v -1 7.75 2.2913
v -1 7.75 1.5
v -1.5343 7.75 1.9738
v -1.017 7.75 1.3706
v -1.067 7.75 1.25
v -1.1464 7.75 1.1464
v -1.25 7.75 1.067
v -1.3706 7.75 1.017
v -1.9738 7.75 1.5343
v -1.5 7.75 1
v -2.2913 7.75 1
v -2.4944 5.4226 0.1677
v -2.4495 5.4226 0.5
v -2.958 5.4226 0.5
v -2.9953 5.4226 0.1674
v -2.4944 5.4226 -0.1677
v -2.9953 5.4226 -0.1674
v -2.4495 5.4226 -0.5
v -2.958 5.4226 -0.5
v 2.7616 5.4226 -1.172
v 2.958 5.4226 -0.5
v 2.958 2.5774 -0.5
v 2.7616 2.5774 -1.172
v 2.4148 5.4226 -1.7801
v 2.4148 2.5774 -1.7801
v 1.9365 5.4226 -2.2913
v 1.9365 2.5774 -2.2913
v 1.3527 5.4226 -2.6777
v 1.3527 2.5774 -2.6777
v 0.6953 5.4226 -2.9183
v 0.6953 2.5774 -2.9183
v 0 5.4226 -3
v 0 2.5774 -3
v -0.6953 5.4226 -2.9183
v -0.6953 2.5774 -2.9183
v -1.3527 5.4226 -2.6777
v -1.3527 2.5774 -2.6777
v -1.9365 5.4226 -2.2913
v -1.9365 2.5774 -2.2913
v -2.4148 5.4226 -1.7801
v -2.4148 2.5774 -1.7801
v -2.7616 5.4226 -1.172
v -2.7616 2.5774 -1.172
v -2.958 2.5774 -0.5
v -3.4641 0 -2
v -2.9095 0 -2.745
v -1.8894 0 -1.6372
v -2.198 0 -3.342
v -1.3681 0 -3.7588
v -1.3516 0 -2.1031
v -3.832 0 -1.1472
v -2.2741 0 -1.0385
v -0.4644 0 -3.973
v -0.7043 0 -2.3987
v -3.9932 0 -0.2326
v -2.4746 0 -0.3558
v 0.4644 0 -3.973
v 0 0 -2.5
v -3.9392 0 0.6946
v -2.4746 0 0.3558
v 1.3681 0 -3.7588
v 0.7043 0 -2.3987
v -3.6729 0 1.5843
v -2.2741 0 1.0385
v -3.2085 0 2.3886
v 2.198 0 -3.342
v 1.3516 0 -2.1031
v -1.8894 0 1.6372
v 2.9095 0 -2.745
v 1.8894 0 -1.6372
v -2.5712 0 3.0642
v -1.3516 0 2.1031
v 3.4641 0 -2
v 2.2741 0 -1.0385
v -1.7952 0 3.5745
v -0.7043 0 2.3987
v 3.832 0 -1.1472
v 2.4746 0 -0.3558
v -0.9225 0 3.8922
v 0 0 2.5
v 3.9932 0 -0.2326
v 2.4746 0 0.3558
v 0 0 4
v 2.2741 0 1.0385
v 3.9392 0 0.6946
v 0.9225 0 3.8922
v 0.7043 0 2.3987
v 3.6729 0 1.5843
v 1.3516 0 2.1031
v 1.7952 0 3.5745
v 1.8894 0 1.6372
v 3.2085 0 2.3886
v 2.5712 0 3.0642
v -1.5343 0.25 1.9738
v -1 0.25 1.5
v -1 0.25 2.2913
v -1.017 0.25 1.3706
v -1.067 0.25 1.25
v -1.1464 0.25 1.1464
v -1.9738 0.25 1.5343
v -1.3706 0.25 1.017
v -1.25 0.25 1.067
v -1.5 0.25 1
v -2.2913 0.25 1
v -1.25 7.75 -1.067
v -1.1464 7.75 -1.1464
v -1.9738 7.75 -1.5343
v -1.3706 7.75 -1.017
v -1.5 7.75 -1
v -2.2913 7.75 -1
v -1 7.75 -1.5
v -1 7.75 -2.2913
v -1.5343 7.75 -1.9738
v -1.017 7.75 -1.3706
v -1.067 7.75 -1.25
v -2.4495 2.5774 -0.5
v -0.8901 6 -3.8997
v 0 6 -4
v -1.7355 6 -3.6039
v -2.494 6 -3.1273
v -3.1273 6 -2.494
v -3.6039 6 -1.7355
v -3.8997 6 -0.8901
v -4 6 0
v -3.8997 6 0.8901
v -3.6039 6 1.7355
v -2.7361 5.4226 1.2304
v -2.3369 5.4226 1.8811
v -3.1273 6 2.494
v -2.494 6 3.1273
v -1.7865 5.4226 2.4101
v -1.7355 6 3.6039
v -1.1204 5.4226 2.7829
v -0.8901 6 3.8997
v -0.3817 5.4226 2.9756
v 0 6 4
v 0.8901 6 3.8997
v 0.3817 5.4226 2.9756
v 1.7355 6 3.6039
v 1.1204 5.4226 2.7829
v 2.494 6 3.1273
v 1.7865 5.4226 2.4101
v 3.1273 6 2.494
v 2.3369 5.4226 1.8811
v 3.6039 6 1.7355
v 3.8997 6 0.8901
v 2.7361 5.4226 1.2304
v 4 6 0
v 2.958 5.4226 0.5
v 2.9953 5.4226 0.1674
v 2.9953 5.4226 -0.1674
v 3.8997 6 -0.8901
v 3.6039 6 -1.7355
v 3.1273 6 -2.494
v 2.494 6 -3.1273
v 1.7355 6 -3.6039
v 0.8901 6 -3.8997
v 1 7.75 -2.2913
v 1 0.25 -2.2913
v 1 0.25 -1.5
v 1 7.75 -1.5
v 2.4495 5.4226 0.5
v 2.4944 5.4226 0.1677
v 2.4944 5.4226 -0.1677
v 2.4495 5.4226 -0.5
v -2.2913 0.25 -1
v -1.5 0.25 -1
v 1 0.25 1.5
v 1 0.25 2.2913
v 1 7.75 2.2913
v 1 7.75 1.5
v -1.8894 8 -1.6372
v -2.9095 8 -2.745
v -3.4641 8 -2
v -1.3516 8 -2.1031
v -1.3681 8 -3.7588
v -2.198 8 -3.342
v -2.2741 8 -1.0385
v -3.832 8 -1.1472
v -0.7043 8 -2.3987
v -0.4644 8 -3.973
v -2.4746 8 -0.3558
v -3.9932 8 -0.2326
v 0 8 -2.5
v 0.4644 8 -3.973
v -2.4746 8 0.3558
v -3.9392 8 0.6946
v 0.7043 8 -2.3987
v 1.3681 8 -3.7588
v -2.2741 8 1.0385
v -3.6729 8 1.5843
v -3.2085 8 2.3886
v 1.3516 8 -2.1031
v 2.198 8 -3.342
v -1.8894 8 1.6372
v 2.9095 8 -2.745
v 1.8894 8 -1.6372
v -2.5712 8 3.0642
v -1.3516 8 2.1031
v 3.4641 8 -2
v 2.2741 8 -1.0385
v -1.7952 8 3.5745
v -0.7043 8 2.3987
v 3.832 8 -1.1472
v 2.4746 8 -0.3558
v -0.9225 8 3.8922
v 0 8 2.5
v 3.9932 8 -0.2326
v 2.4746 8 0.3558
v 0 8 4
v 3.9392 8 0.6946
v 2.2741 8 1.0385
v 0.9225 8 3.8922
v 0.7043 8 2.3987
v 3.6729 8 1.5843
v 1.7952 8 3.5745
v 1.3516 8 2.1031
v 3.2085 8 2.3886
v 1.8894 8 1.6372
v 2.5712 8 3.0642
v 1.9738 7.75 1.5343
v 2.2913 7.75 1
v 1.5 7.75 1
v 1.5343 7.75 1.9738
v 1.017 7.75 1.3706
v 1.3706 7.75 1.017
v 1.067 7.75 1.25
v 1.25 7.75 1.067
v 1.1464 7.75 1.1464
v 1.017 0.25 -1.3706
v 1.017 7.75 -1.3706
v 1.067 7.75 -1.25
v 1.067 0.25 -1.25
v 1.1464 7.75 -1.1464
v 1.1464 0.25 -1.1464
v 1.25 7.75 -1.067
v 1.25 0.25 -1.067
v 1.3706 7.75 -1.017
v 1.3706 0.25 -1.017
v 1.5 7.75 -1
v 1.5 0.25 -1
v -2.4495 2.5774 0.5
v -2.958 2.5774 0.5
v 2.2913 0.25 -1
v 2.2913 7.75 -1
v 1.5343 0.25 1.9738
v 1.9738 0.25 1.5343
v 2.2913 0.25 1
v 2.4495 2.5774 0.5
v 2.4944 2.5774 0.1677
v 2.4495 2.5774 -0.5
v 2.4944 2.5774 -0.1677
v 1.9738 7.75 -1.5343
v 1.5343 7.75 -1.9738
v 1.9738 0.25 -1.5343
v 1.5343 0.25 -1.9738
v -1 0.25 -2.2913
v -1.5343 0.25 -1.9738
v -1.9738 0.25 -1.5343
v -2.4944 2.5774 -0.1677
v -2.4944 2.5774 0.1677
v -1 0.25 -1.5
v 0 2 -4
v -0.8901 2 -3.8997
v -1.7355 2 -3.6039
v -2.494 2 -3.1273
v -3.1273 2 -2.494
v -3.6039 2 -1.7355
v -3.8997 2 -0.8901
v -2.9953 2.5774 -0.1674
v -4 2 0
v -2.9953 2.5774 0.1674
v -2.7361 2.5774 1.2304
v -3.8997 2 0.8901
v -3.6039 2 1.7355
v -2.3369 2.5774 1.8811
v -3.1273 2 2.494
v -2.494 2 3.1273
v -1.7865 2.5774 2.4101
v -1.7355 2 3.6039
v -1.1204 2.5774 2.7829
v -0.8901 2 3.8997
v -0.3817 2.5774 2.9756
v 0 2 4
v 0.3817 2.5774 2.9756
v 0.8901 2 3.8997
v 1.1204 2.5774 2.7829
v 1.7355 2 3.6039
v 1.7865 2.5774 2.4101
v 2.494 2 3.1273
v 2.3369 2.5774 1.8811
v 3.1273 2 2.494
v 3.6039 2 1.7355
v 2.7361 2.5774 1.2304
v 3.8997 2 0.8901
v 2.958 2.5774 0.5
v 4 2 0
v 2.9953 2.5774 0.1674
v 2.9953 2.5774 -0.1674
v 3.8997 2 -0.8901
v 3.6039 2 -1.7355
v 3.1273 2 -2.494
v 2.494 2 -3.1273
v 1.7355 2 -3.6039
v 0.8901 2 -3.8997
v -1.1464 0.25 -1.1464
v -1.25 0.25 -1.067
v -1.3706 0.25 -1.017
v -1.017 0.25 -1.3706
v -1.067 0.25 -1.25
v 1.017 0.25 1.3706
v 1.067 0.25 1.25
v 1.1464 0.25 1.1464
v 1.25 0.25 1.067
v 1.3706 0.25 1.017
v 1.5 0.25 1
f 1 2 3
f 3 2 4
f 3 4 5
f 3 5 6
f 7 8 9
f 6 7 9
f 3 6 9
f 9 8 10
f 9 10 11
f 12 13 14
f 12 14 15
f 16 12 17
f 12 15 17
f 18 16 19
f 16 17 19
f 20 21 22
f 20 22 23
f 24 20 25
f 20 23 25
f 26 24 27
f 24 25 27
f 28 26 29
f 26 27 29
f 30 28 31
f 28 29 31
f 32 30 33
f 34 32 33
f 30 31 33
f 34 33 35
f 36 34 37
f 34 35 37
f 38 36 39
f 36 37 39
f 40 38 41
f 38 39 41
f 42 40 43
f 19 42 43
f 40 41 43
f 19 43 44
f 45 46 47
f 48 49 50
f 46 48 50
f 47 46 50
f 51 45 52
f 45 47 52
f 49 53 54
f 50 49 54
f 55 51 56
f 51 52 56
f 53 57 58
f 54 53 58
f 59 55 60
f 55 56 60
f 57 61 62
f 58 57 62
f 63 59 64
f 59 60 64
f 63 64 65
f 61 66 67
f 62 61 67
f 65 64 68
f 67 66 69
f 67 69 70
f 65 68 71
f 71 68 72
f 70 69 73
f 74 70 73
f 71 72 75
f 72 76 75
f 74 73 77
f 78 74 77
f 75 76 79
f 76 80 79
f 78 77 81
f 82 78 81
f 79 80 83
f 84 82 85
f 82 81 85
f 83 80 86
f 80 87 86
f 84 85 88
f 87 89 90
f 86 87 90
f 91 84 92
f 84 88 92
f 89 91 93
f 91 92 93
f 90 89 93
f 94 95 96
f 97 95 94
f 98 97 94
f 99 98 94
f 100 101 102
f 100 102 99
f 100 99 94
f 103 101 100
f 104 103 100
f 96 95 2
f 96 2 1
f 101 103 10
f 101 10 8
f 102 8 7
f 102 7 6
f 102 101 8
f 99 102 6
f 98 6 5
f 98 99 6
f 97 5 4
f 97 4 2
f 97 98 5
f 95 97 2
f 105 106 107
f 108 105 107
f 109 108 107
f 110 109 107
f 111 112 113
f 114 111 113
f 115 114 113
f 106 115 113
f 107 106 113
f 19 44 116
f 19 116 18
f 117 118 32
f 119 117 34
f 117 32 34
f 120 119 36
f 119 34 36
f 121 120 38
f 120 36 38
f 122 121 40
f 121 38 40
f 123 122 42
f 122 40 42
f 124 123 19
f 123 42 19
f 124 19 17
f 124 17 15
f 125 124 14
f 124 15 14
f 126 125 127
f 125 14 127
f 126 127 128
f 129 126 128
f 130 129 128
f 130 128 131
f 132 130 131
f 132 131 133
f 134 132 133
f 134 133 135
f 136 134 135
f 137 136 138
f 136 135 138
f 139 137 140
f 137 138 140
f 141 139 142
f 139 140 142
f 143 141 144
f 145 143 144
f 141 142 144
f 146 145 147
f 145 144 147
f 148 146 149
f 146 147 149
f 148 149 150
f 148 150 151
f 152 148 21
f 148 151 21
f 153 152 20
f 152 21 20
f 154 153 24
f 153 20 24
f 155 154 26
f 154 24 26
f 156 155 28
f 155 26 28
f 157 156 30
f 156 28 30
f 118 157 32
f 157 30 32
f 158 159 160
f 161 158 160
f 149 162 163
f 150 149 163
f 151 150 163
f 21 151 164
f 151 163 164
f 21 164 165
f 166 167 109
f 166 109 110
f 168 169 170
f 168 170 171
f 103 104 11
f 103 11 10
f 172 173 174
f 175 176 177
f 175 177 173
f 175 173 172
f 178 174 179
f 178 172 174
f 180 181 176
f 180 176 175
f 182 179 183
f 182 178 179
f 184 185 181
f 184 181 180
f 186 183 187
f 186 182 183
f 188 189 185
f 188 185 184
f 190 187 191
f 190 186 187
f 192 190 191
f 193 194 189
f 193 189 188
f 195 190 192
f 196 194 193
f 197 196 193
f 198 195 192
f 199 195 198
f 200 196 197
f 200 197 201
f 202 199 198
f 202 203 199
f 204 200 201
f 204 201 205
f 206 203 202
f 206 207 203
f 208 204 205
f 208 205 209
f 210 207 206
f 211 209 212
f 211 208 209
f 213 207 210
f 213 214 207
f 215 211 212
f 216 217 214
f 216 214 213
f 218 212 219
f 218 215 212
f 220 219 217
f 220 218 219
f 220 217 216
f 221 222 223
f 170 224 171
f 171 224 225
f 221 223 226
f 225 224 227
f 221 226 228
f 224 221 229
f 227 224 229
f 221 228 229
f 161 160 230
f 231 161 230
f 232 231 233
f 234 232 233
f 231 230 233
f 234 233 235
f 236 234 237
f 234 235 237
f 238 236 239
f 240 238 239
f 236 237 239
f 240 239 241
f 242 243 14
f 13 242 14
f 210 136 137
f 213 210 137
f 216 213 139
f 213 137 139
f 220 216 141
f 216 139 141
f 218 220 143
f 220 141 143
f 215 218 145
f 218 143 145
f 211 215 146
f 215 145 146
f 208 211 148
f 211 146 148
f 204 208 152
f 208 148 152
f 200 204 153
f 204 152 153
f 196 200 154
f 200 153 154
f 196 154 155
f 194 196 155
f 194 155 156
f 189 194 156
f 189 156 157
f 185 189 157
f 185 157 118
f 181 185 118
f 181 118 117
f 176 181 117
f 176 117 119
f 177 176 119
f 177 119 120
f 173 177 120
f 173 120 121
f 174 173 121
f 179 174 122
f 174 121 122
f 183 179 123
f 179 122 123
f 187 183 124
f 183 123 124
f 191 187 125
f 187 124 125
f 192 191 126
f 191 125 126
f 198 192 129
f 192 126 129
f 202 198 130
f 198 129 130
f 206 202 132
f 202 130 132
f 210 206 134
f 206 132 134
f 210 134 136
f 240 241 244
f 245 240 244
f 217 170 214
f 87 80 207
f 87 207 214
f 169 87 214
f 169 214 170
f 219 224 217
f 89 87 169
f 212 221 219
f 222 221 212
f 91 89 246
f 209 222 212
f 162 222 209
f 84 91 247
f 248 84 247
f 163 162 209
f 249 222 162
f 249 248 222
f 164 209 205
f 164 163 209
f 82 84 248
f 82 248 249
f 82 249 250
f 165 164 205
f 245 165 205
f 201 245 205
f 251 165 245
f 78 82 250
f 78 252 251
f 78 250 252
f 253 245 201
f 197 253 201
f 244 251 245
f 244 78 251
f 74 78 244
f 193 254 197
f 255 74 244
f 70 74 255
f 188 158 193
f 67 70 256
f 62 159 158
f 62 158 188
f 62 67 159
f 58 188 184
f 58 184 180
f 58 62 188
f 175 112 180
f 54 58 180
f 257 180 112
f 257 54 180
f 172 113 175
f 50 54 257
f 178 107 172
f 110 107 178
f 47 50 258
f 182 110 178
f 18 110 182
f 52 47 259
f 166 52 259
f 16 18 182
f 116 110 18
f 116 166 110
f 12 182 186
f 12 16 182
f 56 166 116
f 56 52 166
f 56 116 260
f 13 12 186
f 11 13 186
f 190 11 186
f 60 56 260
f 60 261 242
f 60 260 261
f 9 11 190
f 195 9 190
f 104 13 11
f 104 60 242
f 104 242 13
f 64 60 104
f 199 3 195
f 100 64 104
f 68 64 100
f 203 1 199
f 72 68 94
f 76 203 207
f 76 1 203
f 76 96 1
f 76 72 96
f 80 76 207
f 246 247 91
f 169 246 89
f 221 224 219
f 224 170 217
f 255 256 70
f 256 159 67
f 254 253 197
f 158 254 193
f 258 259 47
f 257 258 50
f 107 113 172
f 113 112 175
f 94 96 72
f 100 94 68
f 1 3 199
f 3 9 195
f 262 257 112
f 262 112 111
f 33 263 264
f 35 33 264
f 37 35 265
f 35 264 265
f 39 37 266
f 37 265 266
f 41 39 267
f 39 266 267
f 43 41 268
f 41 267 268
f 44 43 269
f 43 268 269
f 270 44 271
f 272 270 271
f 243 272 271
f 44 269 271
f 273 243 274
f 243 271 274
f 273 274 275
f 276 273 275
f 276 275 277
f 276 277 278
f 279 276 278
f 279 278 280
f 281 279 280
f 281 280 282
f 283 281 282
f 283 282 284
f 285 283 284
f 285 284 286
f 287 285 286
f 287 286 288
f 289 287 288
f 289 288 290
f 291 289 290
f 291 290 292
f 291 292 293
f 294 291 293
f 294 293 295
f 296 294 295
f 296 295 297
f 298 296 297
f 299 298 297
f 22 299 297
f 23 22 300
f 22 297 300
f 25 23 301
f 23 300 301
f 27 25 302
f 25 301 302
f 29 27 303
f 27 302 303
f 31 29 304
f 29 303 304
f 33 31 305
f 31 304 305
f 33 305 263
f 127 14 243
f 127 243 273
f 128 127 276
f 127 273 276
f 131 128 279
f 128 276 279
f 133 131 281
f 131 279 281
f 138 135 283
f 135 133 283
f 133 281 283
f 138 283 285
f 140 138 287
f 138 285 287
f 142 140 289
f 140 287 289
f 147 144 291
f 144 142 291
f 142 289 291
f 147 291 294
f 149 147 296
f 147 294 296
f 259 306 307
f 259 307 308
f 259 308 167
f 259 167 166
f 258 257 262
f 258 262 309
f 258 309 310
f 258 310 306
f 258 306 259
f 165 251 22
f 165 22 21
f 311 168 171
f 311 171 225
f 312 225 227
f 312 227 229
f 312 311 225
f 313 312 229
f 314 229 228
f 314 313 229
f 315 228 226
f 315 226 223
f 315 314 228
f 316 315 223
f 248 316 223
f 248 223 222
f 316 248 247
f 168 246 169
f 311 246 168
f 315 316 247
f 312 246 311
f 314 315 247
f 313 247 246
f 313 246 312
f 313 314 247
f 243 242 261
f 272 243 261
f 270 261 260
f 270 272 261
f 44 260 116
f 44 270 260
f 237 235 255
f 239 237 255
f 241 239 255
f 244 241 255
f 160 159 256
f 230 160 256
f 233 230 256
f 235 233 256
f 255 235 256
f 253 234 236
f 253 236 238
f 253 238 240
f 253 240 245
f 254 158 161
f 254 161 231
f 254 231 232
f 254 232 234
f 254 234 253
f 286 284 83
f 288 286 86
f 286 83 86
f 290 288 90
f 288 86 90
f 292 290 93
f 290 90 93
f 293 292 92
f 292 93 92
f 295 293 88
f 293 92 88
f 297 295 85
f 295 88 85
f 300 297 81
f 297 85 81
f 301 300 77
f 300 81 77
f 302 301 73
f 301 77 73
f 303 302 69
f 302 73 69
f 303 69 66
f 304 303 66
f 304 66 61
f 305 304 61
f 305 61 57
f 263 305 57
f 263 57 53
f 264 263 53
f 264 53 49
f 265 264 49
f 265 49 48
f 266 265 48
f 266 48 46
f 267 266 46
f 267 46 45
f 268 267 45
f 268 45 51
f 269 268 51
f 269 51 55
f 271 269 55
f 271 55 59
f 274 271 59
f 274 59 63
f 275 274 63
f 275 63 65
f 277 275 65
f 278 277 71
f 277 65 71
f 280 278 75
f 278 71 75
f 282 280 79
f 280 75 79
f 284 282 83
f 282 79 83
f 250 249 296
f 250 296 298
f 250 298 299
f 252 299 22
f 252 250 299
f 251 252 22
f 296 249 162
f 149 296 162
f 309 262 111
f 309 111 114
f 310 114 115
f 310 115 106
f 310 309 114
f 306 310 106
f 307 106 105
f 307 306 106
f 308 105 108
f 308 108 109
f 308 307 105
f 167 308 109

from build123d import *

# Parameters (mm, degrees)
SKETCH1_R               = 3
SKETCH1_R_2             = 2.5
BOSS_EXTRUDE1_DEPTH     = 8
BOSS_EXTRUDE2_START     = 0.25
BOSS_EXTRUDE2_DEPTH     = 7.5
SKETCH4_R               = 4
SKETCH4_R_2             = 3
BOSS_EXTRUDE3_DEPTH     = 2
BOSS_EXTRUDE4_START     = 6
SKETCH4_2_R             = 4
SKETCH4_2_R_2           = 3
BOSS_EXTRUDE4_DEPTH     = 2
CUT_EXTRUDE1_DEPTH      = 10
CUT_EXTRUDE1_DEPTH_BACK = 10
SKETCH6_W               = 1
SKETCH6_H               = 2.845299462


with BuildPart() as part:
    # Sketch1 → Boss-Extrude1 (new body)
    with BuildSketch(Plane(origin=(0, 0, 0), x_dir=(1, 0, 0), z_dir=(0, 1, 0))):
        Circle(SKETCH1_R)
        Circle(SKETCH1_R_2, mode=Mode.SUBTRACT)
    extrude(amount=BOSS_EXTRUDE1_DEPTH)

    # Sketch3 → Boss-Extrude2 (add)
    with BuildSketch(Plane(origin=(0, 0, 0), x_dir=(1, 0, 0), z_dir=(0, 1, 0)).offset(BOSS_EXTRUDE2_START)):
        with BuildLine():
            Line((1, 2.291287847), (1, 1.5))
            ThreePointArc((1, 1.5), (1.146446609, 1.146446609), (1.5, 1))
            Line((1.5, 1), (2.291287847, 1))
            ThreePointArc((2.291287847, 1), (1.767766953, 1.767766953), (1, 2.291287847))
        make_face()
        with BuildLine():
            Line((1, -2.291287847), (1, -1.5))
            ThreePointArc((1, -1.5), (1.146446609, -1.146446609), (1.5, -1))
            Line((1.5, -1), (2.291287847, -1))
            ThreePointArc((2.291287847, -1), (1.767766953, -1.767766953), (1, -2.291287847))
        make_face()
        with BuildLine():
            Line((-2.291287847, -1), (-1.5, -1))
            ThreePointArc((-1.5, -1), (-1.146446609, -1.146446609), (-1, -1.5))
            Line((-1, -1.5), (-1, -2.291287847))
            ThreePointArc((-1, -2.291287847), (-1.767766953, -1.767766953), (-2.291287847, -1))
        make_face()
        with BuildLine():
            Line((-1, 2.291287847), (-1, 1.5))
            ThreePointArc((-1, 1.5), (-1.146446609, 1.146446609), (-1.5, 1))
            Line((-1.5, 1), (-2.291287847, 1))
            ThreePointArc((-2.291287847, 1), (-1.767766953, 1.767766953), (-1, 2.291287847))
        make_face()
    extrude(amount=BOSS_EXTRUDE2_DEPTH)

    # Sketch4 → Boss-Extrude3 (add)
    with BuildSketch(Plane(origin=(0, 0, 0), x_dir=(1, 0, 0), z_dir=(0, 1, 0))):
        Circle(SKETCH4_R)
        Circle(SKETCH4_R_2, mode=Mode.SUBTRACT)
    extrude(amount=BOSS_EXTRUDE3_DEPTH)

    # Sketch4<2> → Boss-Extrude4 (add)
    with BuildSketch(Plane(origin=(0, 0, 0), x_dir=(1, 0, 0), z_dir=(0, 1, 0)).offset(BOSS_EXTRUDE4_START)):
        Circle(SKETCH4_2_R)
        Circle(SKETCH4_2_R_2, mode=Mode.SUBTRACT)
    extrude(amount=BOSS_EXTRUDE4_DEPTH)

    # Sketch5 → Revolve1 (revolve)
    with BuildSketch(Plane(origin=(0, 0, 0), x_dir=(0, 0, -1), z_dir=(1, 0, 0))):
        Polygon((3, 2.577350269), (4, 2), (3, 2), align=None)
        Polygon((3, 6), (4, 6), (3, 5.422649731), align=None)
    revolve(axis=Axis((0, -0.512701632, 0), (0, 1, 0)))

    # Sketch6 → Cut-Extrude1 (cut, two sides: drawn at the far end of the back side and taken through both)
    with BuildSketch(Plane(origin=(0, 0, 0), x_dir=(0, 0, -1), z_dir=(1, 0, 0)).offset(-CUT_EXTRUDE1_DEPTH_BACK)):
        with Locations((0, 4)):
            Rectangle(SKETCH6_W, SKETCH6_H)
    extrude(amount=CUT_EXTRUDE1_DEPTH + CUT_EXTRUDE1_DEPTH_BACK, mode=Mode.SUBTRACT)


solid = part.part
